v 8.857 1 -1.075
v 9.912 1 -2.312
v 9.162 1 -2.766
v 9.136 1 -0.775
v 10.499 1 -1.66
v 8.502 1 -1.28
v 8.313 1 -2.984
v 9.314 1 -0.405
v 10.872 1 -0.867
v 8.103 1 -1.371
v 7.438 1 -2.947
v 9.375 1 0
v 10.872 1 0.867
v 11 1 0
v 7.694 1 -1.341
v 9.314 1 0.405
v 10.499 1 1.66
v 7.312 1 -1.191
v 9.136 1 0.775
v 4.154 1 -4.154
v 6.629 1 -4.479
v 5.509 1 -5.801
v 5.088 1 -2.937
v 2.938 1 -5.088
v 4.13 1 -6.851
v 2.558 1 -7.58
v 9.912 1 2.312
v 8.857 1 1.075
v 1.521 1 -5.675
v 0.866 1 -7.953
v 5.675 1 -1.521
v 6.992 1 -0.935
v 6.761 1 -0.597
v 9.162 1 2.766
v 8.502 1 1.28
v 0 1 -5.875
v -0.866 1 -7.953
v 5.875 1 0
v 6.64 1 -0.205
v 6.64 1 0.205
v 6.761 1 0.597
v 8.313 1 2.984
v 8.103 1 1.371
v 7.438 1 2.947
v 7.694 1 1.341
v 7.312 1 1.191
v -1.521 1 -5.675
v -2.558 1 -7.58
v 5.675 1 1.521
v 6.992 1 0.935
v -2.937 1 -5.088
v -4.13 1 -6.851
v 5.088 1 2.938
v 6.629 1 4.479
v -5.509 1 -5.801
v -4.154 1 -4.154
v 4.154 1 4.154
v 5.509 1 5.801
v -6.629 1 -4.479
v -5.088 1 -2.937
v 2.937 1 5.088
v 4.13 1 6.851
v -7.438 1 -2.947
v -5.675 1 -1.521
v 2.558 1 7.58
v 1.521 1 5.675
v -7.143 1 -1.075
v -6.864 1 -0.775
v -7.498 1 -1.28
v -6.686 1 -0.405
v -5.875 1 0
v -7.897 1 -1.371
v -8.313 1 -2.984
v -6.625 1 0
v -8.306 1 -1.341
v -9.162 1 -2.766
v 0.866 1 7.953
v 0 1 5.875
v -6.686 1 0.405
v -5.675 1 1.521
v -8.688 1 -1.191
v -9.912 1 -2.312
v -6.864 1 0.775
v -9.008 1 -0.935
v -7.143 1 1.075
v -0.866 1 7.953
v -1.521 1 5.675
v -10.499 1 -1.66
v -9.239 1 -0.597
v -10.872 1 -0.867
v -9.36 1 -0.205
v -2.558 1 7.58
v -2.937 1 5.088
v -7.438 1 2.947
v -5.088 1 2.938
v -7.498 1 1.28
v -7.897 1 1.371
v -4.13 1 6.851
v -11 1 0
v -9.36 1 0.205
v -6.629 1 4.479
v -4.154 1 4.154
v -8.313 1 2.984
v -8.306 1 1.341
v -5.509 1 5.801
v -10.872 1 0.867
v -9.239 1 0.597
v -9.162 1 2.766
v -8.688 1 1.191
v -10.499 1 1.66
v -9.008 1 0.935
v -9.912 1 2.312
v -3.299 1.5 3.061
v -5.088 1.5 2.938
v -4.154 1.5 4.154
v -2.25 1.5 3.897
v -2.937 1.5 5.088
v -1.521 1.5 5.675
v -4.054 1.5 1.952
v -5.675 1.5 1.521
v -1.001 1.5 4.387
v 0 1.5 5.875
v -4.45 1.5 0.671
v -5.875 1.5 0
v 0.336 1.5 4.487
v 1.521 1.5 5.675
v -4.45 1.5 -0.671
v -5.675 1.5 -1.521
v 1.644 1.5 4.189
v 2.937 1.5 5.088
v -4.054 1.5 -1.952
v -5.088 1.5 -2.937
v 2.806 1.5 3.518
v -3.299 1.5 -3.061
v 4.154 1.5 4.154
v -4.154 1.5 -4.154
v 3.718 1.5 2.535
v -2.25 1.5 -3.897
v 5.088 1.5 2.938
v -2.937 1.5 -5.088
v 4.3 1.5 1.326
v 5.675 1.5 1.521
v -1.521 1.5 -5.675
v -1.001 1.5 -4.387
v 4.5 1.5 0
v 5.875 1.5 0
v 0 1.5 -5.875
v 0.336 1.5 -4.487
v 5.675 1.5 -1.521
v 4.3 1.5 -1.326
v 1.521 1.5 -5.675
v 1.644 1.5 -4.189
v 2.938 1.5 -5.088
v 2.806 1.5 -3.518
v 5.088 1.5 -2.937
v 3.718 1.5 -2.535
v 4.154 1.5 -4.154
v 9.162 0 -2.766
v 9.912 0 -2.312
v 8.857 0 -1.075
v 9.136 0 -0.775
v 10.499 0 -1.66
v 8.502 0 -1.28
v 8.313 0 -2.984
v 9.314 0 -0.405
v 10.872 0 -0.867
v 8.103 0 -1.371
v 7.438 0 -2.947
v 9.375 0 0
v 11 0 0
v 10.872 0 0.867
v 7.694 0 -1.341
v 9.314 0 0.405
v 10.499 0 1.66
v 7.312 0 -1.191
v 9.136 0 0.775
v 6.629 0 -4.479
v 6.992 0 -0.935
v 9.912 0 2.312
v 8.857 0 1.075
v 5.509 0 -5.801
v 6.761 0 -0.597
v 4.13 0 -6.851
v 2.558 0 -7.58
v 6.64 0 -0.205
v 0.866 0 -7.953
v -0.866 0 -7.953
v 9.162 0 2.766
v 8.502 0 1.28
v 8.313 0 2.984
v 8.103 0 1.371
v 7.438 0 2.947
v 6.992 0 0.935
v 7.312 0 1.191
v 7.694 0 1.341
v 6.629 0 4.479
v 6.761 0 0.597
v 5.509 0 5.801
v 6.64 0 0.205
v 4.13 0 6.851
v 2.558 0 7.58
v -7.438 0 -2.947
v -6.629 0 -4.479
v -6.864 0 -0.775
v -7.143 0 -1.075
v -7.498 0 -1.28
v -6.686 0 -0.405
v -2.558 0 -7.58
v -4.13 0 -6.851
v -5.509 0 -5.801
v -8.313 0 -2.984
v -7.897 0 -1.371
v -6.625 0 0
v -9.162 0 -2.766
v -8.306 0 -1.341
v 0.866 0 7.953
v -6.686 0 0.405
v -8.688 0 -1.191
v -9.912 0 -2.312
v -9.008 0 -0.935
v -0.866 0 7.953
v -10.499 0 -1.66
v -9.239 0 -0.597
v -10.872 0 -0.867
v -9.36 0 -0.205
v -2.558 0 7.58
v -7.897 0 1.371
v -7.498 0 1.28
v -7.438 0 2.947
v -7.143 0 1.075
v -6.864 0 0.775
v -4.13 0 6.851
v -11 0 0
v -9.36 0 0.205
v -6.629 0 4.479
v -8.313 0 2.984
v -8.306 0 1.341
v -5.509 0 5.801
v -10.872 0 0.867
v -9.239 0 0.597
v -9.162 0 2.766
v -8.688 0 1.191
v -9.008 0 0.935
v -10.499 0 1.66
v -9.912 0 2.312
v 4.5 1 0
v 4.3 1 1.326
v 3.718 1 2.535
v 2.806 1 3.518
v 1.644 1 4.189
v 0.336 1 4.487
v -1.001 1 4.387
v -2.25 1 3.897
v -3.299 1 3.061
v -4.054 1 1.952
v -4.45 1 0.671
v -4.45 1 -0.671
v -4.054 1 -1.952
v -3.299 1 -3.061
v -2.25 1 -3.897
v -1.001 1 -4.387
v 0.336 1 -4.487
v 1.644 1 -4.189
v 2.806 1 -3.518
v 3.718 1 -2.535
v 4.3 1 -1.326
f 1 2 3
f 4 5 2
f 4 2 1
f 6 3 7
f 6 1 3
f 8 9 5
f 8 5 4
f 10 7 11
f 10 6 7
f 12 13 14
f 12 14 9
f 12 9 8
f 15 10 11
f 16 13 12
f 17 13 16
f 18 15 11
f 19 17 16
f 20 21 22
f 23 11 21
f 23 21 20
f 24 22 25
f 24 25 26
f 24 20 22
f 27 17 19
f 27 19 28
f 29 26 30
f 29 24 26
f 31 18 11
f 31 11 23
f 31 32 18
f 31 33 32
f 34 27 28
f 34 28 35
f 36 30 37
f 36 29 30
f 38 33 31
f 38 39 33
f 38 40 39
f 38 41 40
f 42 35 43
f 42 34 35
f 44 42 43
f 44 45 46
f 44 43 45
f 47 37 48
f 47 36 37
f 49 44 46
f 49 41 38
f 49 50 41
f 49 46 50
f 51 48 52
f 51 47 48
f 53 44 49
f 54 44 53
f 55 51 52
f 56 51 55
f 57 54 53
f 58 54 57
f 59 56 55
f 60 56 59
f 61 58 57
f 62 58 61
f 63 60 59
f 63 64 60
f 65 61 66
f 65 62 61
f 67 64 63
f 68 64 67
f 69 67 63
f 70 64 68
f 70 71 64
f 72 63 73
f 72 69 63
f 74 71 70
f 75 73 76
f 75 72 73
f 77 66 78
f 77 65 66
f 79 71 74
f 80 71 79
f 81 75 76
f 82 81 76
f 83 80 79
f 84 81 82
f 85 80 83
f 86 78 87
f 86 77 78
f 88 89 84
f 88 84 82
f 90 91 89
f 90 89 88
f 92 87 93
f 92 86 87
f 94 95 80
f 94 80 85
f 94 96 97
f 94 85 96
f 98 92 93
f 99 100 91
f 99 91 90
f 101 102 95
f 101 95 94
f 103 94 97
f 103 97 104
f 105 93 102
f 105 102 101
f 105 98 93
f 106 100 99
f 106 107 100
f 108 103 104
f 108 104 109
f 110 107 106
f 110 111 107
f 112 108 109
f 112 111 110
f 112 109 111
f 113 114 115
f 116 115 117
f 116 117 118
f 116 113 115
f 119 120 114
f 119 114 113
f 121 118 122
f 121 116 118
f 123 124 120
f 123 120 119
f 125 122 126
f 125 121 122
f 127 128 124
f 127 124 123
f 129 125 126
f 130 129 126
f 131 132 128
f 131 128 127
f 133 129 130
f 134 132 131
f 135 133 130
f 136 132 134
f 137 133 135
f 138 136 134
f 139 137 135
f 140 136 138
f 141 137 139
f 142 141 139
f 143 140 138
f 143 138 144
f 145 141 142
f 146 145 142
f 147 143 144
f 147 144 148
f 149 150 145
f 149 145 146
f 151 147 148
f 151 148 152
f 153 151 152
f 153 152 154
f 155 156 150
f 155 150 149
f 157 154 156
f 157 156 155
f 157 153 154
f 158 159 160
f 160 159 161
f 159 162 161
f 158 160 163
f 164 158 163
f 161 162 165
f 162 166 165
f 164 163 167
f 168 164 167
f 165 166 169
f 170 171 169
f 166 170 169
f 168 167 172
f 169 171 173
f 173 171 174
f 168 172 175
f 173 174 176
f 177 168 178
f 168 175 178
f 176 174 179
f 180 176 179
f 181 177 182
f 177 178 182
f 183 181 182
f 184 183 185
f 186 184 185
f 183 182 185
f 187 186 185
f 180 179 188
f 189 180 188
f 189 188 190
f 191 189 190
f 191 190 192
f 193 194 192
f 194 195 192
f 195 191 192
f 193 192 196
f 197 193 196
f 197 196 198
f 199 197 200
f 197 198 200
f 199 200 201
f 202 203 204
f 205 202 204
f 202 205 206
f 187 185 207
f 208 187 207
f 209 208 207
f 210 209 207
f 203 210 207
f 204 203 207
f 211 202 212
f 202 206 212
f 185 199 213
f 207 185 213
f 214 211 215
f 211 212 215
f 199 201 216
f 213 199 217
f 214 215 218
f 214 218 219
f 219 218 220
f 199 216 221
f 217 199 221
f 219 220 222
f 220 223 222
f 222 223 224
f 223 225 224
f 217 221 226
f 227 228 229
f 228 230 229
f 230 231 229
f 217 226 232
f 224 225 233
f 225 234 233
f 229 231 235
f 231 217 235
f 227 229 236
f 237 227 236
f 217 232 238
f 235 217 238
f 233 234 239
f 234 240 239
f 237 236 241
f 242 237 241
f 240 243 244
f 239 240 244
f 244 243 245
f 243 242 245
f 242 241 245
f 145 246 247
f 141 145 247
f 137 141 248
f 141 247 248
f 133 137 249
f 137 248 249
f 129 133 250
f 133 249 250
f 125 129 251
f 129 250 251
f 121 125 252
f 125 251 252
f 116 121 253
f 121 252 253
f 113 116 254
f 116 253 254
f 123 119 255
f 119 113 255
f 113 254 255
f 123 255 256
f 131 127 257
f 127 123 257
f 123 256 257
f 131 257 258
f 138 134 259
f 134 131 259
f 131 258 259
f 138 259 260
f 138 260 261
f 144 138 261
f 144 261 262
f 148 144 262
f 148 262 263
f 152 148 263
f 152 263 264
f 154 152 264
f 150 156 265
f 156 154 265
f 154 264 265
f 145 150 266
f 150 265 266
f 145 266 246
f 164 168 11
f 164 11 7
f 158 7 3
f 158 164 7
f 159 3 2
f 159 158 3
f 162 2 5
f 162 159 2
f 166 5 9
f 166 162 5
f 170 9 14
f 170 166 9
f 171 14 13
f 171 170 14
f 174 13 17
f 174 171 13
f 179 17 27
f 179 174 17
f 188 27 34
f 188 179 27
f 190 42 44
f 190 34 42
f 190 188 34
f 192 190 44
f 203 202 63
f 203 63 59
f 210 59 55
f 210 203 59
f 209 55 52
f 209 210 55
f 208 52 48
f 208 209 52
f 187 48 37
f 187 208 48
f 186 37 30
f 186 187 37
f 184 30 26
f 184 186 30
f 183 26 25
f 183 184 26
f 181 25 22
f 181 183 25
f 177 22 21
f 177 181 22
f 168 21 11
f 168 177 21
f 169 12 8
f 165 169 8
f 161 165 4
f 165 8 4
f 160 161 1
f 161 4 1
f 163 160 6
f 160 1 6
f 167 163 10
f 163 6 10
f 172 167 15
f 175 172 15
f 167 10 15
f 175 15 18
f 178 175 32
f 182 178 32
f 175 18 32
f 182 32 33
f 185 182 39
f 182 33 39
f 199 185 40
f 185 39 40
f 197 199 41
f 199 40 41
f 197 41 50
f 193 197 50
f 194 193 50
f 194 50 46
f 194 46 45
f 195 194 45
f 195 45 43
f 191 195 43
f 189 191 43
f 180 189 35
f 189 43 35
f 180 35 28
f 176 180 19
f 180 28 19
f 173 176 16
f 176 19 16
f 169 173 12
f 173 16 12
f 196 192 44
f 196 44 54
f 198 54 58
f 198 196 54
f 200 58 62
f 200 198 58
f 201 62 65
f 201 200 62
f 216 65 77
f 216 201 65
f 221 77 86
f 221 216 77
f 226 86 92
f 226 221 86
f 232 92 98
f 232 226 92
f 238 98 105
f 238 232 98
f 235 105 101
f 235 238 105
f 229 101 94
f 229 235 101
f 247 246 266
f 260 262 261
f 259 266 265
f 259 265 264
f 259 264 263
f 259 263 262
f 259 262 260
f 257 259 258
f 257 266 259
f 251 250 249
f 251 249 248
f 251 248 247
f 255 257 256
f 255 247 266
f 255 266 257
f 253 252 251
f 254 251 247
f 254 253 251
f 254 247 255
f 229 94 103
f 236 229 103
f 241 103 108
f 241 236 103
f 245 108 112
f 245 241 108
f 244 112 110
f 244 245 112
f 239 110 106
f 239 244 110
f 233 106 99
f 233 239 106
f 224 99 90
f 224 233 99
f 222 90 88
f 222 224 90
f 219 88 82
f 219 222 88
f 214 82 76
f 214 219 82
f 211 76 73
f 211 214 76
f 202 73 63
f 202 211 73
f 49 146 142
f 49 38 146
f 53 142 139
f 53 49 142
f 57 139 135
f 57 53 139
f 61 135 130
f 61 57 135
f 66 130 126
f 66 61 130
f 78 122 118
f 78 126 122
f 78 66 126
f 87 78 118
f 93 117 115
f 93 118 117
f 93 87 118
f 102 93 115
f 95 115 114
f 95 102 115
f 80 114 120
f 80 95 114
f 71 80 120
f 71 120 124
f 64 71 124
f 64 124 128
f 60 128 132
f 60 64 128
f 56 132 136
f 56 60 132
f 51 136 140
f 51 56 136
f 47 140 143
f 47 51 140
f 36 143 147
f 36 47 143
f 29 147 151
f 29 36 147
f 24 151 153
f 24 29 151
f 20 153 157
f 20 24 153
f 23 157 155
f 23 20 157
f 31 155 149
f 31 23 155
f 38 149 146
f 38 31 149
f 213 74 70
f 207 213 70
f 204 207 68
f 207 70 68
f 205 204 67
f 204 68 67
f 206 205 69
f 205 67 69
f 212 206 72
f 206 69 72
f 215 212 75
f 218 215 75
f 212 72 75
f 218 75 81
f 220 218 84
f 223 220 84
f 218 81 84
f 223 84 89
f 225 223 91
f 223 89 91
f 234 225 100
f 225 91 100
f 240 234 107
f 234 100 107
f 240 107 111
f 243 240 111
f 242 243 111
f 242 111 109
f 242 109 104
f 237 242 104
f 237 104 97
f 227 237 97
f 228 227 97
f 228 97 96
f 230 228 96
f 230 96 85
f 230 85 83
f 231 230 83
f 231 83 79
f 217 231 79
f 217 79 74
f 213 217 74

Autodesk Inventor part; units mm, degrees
ref_plane "YZ Plane" through (0, 0, 0) normal (1, 0, 0) x (0, 1, 0)
ref_plane "XZ Plane" through (0, 0, 0) normal (0, 1, 0) x (-1, 0, 0)
ref_plane "XY Plane" through (0, 0, 0) normal (0, 0, 1) x (1, 0, 0)
sketch "Skizze1" plane through (0, 0, 0) normal (0, 1, 0) x (-1, 0, 0)
  circle A0 centre (0, 0) radius 8
  circle A1 centre (-8, 0) radius 3
  circle A2 centre (8, 0) radius 3
  line L0 (8, 0) -> (-8, 0)
  dimension "d0" = 16
  dimension "d1" = 6
  dimension "d2" = 6
extrude "Extrusion1" add sketch "Skizze1" along normal blind 1
sketch "Skizze2" plane through (0, 1, 0) normal (0, 1, 0) x (1, 0, 0)
  arc A0 (7.4375, 2.9468) -> (-7.4375, 2.9468) centre (0, 0) ccw projected
  circle A1 centre (0, 0) radius 5.875
  circle A2 centre (0, 0) radius 4.5
  dimension "d5" = 11.75
  dimension "d6" = 9
extrude "Extrusion2" add sketch "Skizze2" along normal blind 0.5
sketch "Skizze3" plane through (0, 1, 0) normal (0, 1, 0) x (1, 0, 0)
  arc A0 (7.4375, -2.9468) -> (7.4375, 2.9468) centre (8, 0) ccw projected
  arc A1 (-7.4375, 2.9468) -> (-7.4375, -2.9468) centre (-8, 0) ccw projected
  circle A2 centre (-8, 0) radius 1.375
  circle A3 centre (8, 0) radius 1.375
  dimension "d9" = 2.75
  dimension "d10" = 2.75
extrude "Extrusion3" cut sketch "Skizze3" against normal up to next
properties part number "top"
